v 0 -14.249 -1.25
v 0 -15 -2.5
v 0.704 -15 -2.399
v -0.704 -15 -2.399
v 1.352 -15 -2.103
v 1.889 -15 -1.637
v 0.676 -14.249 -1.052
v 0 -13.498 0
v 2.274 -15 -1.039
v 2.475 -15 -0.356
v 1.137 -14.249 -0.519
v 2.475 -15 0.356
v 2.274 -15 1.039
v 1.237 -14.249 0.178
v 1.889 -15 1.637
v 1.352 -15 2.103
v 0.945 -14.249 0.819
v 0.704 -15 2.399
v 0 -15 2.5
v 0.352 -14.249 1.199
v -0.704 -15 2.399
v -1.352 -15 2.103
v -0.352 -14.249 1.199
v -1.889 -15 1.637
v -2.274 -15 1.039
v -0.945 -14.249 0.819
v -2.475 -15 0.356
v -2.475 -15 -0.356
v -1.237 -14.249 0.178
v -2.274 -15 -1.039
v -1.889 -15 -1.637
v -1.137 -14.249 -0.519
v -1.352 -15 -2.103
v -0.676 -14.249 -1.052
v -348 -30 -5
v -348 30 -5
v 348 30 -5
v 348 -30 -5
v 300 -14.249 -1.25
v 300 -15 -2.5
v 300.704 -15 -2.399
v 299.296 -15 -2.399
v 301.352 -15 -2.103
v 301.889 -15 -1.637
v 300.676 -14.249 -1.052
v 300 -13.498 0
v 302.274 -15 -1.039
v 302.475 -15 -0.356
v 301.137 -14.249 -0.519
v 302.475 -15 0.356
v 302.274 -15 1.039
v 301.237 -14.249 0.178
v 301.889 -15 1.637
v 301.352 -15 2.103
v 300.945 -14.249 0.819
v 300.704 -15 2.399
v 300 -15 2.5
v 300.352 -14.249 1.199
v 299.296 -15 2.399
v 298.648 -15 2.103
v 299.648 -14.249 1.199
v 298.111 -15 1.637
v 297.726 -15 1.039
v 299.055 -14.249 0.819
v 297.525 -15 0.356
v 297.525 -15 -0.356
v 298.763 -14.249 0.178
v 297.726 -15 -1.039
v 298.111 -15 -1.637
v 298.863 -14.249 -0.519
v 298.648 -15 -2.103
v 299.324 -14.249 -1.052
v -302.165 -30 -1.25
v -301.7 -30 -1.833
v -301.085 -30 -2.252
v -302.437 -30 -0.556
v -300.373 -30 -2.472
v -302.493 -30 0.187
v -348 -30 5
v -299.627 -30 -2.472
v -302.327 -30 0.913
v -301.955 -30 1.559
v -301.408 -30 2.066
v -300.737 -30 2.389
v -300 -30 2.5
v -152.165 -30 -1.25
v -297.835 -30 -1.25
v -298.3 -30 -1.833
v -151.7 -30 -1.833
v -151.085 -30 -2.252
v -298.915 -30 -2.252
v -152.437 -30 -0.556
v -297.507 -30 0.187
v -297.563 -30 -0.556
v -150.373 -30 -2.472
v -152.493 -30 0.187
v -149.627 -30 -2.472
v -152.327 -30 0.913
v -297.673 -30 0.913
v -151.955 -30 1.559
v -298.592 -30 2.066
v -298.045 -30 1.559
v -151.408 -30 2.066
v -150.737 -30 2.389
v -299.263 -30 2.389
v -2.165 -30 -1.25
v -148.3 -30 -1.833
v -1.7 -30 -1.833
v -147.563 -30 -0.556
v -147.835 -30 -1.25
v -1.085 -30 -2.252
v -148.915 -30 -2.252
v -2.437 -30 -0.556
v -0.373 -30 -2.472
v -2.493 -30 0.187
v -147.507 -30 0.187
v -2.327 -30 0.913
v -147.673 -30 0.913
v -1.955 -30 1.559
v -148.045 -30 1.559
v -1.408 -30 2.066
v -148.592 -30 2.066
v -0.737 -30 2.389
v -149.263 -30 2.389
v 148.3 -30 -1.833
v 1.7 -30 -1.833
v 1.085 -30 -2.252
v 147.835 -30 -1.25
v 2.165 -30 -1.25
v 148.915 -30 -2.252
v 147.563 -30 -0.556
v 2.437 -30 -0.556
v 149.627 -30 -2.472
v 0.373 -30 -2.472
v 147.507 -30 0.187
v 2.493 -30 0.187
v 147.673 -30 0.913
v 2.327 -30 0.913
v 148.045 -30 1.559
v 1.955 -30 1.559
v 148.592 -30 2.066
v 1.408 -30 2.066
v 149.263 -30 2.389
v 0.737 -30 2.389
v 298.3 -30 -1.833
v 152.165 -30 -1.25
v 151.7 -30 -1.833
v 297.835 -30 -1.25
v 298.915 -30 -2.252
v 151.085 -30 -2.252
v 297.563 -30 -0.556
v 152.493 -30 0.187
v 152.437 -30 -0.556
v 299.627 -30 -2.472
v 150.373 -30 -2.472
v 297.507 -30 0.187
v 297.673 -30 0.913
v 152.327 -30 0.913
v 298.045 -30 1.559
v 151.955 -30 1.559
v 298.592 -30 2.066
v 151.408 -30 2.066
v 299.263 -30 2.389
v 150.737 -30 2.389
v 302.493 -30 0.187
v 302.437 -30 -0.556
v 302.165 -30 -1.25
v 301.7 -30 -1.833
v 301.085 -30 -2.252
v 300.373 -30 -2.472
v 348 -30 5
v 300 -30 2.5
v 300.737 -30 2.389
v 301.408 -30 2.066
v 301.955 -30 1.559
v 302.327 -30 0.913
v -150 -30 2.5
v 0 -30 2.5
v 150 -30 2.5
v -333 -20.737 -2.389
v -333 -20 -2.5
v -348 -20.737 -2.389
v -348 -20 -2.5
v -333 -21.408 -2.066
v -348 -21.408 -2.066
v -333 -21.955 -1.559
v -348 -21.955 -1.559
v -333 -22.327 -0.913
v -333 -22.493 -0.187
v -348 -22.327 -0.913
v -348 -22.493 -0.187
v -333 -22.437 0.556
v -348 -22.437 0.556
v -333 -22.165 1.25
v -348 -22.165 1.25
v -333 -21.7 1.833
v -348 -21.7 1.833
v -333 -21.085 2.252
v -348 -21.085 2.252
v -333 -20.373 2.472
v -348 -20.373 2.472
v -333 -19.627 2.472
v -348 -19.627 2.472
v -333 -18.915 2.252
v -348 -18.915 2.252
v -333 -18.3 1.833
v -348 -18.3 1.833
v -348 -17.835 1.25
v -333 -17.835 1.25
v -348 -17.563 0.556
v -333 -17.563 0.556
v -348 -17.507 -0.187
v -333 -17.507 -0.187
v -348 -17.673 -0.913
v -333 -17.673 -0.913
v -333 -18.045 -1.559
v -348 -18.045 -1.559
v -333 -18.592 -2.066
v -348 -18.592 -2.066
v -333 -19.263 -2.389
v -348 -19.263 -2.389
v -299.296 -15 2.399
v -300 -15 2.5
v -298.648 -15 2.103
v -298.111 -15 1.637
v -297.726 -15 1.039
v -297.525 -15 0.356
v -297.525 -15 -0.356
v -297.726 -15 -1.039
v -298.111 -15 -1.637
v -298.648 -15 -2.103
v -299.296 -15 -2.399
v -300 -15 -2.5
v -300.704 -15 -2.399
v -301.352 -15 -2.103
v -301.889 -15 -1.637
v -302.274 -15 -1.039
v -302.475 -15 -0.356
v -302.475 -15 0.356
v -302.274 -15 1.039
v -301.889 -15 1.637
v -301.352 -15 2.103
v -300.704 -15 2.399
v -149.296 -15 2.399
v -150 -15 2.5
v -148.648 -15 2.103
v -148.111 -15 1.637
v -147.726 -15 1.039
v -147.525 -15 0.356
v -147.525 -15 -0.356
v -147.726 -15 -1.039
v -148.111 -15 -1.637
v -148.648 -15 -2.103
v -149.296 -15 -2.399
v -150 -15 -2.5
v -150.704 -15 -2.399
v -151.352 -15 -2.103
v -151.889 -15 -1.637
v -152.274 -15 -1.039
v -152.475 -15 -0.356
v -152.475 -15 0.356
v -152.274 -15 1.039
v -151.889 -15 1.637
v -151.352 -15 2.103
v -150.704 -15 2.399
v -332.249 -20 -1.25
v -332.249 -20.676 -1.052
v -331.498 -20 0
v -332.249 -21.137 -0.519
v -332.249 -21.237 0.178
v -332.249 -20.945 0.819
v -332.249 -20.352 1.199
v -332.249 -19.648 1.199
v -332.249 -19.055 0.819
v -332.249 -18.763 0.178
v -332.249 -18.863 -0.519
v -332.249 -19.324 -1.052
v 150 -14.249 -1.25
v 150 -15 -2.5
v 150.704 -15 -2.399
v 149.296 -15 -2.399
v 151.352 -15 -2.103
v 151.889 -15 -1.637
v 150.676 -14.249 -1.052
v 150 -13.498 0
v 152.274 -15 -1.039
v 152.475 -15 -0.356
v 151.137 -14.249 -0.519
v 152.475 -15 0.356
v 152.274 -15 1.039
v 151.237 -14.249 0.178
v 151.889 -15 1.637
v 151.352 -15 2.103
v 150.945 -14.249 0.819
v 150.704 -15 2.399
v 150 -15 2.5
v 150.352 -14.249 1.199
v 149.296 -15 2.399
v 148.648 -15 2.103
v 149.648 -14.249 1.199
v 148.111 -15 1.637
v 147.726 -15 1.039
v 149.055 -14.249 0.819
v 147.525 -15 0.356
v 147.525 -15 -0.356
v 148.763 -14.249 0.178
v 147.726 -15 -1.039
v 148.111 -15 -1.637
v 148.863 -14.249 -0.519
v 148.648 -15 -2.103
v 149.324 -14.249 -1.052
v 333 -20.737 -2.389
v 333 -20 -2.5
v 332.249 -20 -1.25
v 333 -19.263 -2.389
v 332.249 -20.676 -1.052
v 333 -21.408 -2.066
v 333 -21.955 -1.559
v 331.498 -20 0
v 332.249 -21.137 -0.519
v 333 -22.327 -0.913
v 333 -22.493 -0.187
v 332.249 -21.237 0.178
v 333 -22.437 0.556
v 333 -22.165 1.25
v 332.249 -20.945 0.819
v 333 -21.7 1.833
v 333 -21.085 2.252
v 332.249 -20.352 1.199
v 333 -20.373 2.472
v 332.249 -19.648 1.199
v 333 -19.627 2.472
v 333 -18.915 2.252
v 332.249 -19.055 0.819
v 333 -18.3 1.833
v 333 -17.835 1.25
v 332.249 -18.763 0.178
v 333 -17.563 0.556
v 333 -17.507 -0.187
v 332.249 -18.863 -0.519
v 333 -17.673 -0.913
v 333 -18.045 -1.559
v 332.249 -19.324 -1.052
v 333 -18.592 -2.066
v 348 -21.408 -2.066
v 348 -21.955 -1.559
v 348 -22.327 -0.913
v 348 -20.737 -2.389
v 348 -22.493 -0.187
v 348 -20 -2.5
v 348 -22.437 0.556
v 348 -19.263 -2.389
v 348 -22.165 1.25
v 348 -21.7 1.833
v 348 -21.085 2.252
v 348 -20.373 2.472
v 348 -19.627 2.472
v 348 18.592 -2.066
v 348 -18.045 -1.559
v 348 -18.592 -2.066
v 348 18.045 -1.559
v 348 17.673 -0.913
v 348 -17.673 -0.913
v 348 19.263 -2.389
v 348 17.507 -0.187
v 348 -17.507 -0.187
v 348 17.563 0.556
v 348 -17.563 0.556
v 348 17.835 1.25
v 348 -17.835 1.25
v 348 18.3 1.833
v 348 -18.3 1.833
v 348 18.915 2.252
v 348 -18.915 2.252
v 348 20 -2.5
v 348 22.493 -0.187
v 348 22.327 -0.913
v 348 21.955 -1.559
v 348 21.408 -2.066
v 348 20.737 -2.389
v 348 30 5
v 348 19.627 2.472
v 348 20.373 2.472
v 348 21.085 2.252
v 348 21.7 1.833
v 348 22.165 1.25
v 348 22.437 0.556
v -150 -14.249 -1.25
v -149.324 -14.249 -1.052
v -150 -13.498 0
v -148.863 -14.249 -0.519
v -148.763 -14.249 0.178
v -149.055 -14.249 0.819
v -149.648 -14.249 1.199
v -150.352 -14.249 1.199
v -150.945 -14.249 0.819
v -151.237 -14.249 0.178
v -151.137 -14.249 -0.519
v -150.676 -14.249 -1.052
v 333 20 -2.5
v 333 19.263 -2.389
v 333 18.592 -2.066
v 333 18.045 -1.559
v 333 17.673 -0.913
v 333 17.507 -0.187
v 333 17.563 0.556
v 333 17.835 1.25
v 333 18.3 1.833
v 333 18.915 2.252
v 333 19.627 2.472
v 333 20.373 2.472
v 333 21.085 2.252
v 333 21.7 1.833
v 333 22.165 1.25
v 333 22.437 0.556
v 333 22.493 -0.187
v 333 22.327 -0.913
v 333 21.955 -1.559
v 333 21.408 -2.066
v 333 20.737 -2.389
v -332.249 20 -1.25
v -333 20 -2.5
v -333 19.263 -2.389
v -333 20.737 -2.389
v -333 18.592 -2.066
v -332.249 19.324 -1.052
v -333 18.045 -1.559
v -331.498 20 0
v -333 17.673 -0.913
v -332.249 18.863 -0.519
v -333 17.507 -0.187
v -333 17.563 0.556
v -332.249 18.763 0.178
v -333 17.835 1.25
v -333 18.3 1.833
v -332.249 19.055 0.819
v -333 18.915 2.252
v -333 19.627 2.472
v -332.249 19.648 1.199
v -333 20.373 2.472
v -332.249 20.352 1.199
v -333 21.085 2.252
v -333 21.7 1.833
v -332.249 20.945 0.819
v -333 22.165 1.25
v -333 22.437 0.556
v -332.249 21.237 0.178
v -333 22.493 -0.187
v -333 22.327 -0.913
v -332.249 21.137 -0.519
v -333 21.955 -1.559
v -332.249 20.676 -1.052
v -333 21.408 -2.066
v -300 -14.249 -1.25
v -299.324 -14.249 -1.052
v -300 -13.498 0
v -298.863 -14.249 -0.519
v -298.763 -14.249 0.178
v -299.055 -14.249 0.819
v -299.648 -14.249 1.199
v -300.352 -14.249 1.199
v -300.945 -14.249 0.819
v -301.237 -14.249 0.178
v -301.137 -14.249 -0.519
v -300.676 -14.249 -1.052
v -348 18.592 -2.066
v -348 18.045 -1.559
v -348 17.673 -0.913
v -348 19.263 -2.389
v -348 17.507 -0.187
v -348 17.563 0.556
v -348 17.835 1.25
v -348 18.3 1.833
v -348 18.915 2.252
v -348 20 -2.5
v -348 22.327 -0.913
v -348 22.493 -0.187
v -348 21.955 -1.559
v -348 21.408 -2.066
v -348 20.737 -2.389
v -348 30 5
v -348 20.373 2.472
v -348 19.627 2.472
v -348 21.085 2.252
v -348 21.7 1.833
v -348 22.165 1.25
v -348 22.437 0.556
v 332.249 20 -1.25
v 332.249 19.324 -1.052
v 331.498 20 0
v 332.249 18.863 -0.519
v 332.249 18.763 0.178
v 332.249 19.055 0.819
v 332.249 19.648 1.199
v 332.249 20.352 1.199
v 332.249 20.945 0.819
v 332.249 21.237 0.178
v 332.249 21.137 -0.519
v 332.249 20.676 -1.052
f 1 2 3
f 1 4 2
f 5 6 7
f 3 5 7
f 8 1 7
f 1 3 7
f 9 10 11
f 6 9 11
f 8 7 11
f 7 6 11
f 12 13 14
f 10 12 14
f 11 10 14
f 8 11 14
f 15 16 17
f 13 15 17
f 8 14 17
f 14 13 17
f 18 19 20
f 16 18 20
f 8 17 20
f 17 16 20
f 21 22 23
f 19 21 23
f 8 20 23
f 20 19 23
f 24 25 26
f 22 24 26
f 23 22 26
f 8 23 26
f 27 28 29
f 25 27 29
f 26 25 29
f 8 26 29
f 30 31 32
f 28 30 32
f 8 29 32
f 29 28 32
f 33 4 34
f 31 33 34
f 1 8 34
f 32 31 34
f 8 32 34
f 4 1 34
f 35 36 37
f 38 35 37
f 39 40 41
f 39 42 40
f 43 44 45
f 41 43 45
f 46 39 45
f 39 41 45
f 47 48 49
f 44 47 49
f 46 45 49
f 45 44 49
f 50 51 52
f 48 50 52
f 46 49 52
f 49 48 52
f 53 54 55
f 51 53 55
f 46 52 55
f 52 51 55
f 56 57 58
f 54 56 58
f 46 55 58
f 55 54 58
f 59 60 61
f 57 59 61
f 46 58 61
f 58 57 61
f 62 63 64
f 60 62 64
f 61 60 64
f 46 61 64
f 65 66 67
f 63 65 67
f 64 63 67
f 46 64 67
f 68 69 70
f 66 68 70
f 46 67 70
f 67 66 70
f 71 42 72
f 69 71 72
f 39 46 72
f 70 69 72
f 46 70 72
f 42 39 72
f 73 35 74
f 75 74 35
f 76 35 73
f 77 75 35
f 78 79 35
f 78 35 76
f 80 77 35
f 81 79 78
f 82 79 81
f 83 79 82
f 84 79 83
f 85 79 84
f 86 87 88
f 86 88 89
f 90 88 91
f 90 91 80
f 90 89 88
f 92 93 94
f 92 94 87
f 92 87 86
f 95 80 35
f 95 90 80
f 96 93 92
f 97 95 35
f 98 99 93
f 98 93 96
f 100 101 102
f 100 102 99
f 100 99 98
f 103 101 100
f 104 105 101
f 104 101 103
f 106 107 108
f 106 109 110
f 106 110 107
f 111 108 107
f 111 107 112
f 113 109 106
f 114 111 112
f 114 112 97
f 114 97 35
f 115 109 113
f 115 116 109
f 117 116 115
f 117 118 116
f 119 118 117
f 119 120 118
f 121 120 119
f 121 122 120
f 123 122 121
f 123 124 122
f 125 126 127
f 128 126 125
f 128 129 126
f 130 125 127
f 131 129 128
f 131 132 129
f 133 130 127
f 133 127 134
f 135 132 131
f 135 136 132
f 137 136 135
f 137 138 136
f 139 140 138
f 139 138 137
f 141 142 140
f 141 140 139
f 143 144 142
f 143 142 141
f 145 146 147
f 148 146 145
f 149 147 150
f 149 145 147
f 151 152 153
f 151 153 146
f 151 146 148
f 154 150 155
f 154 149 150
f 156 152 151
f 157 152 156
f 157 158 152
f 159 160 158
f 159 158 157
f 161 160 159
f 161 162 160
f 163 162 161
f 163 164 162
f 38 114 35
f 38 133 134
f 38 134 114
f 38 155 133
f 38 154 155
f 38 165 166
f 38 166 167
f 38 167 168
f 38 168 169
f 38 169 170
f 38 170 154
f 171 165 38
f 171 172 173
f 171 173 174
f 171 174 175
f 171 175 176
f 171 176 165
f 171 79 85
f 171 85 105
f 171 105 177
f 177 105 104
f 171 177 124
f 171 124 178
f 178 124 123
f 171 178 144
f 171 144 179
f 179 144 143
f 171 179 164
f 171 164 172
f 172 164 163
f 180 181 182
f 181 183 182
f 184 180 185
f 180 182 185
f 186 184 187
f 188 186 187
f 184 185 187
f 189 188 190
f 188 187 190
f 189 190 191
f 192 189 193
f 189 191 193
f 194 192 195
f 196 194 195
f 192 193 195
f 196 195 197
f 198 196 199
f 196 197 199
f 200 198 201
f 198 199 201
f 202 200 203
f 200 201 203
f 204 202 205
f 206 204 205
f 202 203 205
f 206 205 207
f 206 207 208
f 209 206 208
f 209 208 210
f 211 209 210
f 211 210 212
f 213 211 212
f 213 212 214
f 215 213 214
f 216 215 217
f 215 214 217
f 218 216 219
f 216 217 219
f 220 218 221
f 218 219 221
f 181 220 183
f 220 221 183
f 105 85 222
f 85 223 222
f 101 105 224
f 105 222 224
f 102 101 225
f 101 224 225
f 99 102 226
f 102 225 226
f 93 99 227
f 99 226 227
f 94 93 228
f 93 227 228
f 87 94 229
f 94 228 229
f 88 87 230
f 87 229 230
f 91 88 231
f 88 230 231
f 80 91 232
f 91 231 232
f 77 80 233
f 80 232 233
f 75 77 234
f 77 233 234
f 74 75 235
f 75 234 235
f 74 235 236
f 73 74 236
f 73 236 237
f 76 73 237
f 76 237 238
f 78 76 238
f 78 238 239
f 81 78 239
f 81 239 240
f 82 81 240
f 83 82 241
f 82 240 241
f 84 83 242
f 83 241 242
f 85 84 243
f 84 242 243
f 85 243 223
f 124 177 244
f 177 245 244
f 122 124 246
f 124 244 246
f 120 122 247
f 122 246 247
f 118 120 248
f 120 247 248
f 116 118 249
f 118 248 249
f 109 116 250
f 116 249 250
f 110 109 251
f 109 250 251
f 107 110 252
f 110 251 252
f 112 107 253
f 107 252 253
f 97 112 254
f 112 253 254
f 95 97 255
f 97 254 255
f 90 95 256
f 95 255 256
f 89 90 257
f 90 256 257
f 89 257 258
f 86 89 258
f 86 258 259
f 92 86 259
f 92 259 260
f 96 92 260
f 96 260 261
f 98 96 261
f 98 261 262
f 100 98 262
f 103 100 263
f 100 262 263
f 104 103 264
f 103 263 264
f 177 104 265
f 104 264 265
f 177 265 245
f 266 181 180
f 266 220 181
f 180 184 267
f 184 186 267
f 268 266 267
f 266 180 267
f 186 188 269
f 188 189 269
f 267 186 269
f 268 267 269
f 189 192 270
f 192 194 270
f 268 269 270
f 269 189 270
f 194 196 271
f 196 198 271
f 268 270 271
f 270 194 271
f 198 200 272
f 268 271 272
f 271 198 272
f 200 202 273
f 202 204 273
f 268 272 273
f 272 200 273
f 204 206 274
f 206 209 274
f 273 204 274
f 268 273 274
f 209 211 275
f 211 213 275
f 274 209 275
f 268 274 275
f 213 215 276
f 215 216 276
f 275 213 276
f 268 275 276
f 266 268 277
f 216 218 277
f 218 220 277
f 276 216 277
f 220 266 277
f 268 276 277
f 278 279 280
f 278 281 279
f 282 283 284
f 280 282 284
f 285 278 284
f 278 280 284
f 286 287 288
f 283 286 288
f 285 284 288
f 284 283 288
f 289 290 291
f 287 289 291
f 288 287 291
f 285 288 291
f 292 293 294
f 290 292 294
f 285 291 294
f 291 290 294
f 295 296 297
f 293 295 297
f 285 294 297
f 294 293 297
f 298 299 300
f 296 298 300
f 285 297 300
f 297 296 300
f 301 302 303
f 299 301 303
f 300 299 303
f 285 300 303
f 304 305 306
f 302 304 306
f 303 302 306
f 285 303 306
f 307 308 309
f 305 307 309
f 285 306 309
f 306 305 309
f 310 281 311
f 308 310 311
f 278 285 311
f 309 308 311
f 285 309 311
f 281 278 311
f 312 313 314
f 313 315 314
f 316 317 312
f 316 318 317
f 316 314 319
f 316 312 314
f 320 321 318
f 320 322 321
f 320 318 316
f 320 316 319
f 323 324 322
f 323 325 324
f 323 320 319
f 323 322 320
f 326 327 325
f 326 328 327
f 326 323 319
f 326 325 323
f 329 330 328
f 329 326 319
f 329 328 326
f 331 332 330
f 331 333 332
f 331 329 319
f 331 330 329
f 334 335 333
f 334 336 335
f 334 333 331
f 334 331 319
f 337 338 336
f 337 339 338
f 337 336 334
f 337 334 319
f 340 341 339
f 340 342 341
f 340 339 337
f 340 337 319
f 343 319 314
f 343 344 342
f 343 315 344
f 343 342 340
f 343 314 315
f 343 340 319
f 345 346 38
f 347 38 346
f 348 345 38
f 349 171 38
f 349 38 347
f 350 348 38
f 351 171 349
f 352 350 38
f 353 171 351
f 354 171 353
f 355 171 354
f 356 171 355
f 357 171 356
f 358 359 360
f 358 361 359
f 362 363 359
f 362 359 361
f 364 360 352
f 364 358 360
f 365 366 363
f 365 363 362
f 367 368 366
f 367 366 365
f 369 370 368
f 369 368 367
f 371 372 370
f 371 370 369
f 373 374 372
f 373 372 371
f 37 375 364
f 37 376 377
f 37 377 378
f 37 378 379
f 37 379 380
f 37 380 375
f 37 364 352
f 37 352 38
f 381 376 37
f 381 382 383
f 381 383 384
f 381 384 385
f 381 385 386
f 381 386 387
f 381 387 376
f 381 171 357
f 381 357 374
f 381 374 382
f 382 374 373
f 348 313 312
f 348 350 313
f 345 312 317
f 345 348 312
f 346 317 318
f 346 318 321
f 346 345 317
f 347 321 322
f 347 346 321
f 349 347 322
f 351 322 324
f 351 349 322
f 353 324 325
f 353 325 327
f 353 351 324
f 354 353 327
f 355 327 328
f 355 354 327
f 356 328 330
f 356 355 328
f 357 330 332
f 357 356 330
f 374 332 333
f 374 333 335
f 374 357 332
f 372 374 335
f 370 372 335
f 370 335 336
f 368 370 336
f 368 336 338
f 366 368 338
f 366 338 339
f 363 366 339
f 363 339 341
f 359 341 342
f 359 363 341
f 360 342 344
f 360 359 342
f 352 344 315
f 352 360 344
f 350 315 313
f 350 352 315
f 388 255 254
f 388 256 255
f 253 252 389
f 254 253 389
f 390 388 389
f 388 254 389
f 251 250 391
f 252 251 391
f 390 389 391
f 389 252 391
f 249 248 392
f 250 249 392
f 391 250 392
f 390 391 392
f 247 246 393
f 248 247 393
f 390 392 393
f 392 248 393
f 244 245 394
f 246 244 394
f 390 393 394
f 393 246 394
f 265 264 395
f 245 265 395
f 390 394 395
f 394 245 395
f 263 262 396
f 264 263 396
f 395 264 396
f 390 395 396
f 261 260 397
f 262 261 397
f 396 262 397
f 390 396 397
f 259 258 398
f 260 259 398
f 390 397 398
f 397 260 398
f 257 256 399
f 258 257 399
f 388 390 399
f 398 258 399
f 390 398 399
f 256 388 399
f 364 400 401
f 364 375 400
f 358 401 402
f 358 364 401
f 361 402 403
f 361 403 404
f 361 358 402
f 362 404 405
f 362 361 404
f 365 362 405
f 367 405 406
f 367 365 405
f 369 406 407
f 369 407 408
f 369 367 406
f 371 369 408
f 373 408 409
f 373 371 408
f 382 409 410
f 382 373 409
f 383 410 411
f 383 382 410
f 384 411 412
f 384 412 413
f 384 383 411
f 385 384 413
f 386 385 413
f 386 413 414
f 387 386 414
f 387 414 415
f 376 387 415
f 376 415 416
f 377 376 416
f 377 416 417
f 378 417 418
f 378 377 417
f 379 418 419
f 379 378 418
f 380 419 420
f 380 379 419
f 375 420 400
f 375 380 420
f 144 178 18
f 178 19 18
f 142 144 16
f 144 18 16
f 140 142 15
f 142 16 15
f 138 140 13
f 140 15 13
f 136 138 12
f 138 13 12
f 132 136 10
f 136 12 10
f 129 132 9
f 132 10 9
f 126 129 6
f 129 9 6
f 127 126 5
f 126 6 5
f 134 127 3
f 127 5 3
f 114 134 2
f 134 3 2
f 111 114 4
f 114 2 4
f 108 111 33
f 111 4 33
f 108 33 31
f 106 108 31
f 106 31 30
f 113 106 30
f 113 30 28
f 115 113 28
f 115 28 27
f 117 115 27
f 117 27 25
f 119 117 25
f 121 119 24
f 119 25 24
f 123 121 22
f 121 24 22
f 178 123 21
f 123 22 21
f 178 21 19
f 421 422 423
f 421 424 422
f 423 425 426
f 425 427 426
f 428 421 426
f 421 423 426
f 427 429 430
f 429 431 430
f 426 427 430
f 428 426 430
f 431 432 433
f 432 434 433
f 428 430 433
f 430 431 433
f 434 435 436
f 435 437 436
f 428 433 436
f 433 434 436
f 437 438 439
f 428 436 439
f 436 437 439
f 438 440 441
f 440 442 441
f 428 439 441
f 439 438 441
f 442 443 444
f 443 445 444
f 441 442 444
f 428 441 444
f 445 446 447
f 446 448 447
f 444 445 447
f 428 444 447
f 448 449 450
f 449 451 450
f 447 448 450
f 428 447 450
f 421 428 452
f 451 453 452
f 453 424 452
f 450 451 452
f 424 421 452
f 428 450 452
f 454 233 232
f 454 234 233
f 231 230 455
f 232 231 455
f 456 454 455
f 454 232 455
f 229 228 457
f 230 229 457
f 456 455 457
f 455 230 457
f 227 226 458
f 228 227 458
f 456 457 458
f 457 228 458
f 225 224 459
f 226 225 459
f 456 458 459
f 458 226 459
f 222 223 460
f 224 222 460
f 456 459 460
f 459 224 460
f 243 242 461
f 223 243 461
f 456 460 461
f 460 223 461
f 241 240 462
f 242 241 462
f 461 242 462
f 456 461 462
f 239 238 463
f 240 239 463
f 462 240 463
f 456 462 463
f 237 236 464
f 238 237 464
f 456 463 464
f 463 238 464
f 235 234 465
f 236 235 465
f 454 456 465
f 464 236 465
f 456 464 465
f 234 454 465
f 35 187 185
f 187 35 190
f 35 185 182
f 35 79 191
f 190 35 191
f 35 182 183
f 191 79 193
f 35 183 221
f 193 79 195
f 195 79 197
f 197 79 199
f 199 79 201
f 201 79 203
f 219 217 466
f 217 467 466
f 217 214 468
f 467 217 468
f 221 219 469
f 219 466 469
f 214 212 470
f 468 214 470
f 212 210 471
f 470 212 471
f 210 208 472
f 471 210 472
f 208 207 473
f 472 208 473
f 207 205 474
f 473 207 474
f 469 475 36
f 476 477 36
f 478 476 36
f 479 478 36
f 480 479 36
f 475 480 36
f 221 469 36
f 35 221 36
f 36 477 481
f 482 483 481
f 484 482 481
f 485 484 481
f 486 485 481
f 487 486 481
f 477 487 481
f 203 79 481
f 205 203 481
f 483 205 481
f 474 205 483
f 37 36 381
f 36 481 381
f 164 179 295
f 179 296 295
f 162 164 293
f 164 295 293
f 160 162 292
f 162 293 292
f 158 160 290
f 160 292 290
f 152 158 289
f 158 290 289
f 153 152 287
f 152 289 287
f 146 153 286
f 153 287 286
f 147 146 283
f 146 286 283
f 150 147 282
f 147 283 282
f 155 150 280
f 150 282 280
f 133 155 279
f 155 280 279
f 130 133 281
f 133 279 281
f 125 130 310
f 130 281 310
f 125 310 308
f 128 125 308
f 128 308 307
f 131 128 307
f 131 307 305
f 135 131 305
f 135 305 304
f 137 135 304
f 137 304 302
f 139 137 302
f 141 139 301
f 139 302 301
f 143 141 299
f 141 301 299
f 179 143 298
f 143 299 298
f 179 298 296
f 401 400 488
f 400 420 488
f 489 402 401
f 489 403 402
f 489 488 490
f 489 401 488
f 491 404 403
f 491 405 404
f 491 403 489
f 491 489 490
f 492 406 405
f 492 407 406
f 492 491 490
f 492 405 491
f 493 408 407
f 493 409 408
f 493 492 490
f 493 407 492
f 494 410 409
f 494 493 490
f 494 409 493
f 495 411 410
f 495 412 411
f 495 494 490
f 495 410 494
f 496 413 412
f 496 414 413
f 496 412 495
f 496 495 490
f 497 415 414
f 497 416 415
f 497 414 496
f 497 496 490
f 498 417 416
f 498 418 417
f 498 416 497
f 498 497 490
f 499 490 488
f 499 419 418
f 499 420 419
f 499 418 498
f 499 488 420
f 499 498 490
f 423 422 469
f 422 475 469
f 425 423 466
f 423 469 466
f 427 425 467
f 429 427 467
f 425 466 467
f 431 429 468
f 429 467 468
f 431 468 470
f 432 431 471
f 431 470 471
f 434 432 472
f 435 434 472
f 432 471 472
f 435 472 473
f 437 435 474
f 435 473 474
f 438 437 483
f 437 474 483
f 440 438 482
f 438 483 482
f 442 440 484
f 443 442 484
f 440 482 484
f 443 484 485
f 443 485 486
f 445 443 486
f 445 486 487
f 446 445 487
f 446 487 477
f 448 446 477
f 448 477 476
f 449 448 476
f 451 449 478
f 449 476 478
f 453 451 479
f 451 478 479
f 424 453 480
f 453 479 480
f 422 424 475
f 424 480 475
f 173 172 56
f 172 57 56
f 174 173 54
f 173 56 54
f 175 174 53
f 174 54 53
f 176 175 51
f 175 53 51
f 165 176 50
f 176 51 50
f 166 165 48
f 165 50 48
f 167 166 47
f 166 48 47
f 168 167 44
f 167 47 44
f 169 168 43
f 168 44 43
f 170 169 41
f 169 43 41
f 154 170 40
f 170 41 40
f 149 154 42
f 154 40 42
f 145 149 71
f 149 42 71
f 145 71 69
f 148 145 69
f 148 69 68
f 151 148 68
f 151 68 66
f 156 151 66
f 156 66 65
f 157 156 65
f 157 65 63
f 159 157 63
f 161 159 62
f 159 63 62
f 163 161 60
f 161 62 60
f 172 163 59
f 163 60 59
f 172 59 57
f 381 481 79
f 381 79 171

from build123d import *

# Parameters (mm, degrees)
SKETCH_1_W             = 696
SKETCH_1_H             = 60
EXTRUDE_1_DEPTH        = 5
PATTERN_LINEAR_1_COUNT = 2
PATTERN_LINEAR_1_PITCH = 40
HOLE_WIZARD_M6_1_D     = 5
HOLE_WIZARD_M6_1_DEPTH = 15
HOLE_WIZARD_M6_1_TIP   = 1.502151548


with BuildPart() as part:
    # 草图1 → 凸台-拉伸1 (new body, symmetric)
    with BuildSketch(Plane.XY):
        Rectangle(SKETCH_1_W, SKETCH_1_H)
    extrude(amount=EXTRUDE_1_DEPTH, both=True)

    # 草图11 → M6 螺纹孔2 (revolve, cut)
    with BuildSketch(Plane(origin=(348, 20, 0), x_dir=(0, 0, -1), z_dir=(0, 1, 0))):
        Polygon((0, 0), (0, 16.502151548), (2.5, 15), (2.5, 0), align=None)
    hole_wizard_m6_2 = revolve(axis=Axis((354.35, 20, 0), (-1, 0, 0)), mode=Mode.SUBTRACT)

    # 阵列(线性)1: M6 螺纹孔2 ×2
    with Locations(*[(0, -i * PATTERN_LINEAR_1_PITCH, 0) for i in range(1, PATTERN_LINEAR_1_COUNT)]):
        add(hole_wizard_m6_2, mode=Mode.SUBTRACT)

    # 镜向2: M6 螺纹孔2 across plane
    add(hole_wizard_m6_2.mirror(Plane(origin=(0, 0, 0), x_dir=(0, 0, 1), z_dir=(1, 0, 0))), mode=Mode.SUBTRACT)

    # 镜向2 copy 1 sketch → 镜向2 copy 1 (revolve, cut)
    with BuildSketch(Plane(origin=(-348, -20, 0), x_dir=(0, 0, -1), z_dir=(0, 1, 0))):
        Polygon((0, 0), (0, -16.502151548), (2.5, -15), (2.5, 0), align=None)
    revolve(axis=Axis((-354.35, -20, 0), (-1, 0, 0)), mode=Mode.SUBTRACT)

    # M6 螺纹孔1
    with Locations(Plane(origin=(-300, -30, 0), x_dir=(0, 0, -1), z_dir=(0, -1, 0))):
        with Locations((0, 0), (0, 150), (0, 450), (0, 600), (0, 300)):
            Hole(HOLE_WIZARD_M6_1_D / 2, depth=HOLE_WIZARD_M6_1_DEPTH)
            with Locations((0, 0, -(HOLE_WIZARD_M6_1_DEPTH + HOLE_WIZARD_M6_1_TIP / 2))):  # 118° drill point
                Cone(0, HOLE_WIZARD_M6_1_D / 2, HOLE_WIZARD_M6_1_TIP, mode=Mode.SUBTRACT)


solid = part.part
